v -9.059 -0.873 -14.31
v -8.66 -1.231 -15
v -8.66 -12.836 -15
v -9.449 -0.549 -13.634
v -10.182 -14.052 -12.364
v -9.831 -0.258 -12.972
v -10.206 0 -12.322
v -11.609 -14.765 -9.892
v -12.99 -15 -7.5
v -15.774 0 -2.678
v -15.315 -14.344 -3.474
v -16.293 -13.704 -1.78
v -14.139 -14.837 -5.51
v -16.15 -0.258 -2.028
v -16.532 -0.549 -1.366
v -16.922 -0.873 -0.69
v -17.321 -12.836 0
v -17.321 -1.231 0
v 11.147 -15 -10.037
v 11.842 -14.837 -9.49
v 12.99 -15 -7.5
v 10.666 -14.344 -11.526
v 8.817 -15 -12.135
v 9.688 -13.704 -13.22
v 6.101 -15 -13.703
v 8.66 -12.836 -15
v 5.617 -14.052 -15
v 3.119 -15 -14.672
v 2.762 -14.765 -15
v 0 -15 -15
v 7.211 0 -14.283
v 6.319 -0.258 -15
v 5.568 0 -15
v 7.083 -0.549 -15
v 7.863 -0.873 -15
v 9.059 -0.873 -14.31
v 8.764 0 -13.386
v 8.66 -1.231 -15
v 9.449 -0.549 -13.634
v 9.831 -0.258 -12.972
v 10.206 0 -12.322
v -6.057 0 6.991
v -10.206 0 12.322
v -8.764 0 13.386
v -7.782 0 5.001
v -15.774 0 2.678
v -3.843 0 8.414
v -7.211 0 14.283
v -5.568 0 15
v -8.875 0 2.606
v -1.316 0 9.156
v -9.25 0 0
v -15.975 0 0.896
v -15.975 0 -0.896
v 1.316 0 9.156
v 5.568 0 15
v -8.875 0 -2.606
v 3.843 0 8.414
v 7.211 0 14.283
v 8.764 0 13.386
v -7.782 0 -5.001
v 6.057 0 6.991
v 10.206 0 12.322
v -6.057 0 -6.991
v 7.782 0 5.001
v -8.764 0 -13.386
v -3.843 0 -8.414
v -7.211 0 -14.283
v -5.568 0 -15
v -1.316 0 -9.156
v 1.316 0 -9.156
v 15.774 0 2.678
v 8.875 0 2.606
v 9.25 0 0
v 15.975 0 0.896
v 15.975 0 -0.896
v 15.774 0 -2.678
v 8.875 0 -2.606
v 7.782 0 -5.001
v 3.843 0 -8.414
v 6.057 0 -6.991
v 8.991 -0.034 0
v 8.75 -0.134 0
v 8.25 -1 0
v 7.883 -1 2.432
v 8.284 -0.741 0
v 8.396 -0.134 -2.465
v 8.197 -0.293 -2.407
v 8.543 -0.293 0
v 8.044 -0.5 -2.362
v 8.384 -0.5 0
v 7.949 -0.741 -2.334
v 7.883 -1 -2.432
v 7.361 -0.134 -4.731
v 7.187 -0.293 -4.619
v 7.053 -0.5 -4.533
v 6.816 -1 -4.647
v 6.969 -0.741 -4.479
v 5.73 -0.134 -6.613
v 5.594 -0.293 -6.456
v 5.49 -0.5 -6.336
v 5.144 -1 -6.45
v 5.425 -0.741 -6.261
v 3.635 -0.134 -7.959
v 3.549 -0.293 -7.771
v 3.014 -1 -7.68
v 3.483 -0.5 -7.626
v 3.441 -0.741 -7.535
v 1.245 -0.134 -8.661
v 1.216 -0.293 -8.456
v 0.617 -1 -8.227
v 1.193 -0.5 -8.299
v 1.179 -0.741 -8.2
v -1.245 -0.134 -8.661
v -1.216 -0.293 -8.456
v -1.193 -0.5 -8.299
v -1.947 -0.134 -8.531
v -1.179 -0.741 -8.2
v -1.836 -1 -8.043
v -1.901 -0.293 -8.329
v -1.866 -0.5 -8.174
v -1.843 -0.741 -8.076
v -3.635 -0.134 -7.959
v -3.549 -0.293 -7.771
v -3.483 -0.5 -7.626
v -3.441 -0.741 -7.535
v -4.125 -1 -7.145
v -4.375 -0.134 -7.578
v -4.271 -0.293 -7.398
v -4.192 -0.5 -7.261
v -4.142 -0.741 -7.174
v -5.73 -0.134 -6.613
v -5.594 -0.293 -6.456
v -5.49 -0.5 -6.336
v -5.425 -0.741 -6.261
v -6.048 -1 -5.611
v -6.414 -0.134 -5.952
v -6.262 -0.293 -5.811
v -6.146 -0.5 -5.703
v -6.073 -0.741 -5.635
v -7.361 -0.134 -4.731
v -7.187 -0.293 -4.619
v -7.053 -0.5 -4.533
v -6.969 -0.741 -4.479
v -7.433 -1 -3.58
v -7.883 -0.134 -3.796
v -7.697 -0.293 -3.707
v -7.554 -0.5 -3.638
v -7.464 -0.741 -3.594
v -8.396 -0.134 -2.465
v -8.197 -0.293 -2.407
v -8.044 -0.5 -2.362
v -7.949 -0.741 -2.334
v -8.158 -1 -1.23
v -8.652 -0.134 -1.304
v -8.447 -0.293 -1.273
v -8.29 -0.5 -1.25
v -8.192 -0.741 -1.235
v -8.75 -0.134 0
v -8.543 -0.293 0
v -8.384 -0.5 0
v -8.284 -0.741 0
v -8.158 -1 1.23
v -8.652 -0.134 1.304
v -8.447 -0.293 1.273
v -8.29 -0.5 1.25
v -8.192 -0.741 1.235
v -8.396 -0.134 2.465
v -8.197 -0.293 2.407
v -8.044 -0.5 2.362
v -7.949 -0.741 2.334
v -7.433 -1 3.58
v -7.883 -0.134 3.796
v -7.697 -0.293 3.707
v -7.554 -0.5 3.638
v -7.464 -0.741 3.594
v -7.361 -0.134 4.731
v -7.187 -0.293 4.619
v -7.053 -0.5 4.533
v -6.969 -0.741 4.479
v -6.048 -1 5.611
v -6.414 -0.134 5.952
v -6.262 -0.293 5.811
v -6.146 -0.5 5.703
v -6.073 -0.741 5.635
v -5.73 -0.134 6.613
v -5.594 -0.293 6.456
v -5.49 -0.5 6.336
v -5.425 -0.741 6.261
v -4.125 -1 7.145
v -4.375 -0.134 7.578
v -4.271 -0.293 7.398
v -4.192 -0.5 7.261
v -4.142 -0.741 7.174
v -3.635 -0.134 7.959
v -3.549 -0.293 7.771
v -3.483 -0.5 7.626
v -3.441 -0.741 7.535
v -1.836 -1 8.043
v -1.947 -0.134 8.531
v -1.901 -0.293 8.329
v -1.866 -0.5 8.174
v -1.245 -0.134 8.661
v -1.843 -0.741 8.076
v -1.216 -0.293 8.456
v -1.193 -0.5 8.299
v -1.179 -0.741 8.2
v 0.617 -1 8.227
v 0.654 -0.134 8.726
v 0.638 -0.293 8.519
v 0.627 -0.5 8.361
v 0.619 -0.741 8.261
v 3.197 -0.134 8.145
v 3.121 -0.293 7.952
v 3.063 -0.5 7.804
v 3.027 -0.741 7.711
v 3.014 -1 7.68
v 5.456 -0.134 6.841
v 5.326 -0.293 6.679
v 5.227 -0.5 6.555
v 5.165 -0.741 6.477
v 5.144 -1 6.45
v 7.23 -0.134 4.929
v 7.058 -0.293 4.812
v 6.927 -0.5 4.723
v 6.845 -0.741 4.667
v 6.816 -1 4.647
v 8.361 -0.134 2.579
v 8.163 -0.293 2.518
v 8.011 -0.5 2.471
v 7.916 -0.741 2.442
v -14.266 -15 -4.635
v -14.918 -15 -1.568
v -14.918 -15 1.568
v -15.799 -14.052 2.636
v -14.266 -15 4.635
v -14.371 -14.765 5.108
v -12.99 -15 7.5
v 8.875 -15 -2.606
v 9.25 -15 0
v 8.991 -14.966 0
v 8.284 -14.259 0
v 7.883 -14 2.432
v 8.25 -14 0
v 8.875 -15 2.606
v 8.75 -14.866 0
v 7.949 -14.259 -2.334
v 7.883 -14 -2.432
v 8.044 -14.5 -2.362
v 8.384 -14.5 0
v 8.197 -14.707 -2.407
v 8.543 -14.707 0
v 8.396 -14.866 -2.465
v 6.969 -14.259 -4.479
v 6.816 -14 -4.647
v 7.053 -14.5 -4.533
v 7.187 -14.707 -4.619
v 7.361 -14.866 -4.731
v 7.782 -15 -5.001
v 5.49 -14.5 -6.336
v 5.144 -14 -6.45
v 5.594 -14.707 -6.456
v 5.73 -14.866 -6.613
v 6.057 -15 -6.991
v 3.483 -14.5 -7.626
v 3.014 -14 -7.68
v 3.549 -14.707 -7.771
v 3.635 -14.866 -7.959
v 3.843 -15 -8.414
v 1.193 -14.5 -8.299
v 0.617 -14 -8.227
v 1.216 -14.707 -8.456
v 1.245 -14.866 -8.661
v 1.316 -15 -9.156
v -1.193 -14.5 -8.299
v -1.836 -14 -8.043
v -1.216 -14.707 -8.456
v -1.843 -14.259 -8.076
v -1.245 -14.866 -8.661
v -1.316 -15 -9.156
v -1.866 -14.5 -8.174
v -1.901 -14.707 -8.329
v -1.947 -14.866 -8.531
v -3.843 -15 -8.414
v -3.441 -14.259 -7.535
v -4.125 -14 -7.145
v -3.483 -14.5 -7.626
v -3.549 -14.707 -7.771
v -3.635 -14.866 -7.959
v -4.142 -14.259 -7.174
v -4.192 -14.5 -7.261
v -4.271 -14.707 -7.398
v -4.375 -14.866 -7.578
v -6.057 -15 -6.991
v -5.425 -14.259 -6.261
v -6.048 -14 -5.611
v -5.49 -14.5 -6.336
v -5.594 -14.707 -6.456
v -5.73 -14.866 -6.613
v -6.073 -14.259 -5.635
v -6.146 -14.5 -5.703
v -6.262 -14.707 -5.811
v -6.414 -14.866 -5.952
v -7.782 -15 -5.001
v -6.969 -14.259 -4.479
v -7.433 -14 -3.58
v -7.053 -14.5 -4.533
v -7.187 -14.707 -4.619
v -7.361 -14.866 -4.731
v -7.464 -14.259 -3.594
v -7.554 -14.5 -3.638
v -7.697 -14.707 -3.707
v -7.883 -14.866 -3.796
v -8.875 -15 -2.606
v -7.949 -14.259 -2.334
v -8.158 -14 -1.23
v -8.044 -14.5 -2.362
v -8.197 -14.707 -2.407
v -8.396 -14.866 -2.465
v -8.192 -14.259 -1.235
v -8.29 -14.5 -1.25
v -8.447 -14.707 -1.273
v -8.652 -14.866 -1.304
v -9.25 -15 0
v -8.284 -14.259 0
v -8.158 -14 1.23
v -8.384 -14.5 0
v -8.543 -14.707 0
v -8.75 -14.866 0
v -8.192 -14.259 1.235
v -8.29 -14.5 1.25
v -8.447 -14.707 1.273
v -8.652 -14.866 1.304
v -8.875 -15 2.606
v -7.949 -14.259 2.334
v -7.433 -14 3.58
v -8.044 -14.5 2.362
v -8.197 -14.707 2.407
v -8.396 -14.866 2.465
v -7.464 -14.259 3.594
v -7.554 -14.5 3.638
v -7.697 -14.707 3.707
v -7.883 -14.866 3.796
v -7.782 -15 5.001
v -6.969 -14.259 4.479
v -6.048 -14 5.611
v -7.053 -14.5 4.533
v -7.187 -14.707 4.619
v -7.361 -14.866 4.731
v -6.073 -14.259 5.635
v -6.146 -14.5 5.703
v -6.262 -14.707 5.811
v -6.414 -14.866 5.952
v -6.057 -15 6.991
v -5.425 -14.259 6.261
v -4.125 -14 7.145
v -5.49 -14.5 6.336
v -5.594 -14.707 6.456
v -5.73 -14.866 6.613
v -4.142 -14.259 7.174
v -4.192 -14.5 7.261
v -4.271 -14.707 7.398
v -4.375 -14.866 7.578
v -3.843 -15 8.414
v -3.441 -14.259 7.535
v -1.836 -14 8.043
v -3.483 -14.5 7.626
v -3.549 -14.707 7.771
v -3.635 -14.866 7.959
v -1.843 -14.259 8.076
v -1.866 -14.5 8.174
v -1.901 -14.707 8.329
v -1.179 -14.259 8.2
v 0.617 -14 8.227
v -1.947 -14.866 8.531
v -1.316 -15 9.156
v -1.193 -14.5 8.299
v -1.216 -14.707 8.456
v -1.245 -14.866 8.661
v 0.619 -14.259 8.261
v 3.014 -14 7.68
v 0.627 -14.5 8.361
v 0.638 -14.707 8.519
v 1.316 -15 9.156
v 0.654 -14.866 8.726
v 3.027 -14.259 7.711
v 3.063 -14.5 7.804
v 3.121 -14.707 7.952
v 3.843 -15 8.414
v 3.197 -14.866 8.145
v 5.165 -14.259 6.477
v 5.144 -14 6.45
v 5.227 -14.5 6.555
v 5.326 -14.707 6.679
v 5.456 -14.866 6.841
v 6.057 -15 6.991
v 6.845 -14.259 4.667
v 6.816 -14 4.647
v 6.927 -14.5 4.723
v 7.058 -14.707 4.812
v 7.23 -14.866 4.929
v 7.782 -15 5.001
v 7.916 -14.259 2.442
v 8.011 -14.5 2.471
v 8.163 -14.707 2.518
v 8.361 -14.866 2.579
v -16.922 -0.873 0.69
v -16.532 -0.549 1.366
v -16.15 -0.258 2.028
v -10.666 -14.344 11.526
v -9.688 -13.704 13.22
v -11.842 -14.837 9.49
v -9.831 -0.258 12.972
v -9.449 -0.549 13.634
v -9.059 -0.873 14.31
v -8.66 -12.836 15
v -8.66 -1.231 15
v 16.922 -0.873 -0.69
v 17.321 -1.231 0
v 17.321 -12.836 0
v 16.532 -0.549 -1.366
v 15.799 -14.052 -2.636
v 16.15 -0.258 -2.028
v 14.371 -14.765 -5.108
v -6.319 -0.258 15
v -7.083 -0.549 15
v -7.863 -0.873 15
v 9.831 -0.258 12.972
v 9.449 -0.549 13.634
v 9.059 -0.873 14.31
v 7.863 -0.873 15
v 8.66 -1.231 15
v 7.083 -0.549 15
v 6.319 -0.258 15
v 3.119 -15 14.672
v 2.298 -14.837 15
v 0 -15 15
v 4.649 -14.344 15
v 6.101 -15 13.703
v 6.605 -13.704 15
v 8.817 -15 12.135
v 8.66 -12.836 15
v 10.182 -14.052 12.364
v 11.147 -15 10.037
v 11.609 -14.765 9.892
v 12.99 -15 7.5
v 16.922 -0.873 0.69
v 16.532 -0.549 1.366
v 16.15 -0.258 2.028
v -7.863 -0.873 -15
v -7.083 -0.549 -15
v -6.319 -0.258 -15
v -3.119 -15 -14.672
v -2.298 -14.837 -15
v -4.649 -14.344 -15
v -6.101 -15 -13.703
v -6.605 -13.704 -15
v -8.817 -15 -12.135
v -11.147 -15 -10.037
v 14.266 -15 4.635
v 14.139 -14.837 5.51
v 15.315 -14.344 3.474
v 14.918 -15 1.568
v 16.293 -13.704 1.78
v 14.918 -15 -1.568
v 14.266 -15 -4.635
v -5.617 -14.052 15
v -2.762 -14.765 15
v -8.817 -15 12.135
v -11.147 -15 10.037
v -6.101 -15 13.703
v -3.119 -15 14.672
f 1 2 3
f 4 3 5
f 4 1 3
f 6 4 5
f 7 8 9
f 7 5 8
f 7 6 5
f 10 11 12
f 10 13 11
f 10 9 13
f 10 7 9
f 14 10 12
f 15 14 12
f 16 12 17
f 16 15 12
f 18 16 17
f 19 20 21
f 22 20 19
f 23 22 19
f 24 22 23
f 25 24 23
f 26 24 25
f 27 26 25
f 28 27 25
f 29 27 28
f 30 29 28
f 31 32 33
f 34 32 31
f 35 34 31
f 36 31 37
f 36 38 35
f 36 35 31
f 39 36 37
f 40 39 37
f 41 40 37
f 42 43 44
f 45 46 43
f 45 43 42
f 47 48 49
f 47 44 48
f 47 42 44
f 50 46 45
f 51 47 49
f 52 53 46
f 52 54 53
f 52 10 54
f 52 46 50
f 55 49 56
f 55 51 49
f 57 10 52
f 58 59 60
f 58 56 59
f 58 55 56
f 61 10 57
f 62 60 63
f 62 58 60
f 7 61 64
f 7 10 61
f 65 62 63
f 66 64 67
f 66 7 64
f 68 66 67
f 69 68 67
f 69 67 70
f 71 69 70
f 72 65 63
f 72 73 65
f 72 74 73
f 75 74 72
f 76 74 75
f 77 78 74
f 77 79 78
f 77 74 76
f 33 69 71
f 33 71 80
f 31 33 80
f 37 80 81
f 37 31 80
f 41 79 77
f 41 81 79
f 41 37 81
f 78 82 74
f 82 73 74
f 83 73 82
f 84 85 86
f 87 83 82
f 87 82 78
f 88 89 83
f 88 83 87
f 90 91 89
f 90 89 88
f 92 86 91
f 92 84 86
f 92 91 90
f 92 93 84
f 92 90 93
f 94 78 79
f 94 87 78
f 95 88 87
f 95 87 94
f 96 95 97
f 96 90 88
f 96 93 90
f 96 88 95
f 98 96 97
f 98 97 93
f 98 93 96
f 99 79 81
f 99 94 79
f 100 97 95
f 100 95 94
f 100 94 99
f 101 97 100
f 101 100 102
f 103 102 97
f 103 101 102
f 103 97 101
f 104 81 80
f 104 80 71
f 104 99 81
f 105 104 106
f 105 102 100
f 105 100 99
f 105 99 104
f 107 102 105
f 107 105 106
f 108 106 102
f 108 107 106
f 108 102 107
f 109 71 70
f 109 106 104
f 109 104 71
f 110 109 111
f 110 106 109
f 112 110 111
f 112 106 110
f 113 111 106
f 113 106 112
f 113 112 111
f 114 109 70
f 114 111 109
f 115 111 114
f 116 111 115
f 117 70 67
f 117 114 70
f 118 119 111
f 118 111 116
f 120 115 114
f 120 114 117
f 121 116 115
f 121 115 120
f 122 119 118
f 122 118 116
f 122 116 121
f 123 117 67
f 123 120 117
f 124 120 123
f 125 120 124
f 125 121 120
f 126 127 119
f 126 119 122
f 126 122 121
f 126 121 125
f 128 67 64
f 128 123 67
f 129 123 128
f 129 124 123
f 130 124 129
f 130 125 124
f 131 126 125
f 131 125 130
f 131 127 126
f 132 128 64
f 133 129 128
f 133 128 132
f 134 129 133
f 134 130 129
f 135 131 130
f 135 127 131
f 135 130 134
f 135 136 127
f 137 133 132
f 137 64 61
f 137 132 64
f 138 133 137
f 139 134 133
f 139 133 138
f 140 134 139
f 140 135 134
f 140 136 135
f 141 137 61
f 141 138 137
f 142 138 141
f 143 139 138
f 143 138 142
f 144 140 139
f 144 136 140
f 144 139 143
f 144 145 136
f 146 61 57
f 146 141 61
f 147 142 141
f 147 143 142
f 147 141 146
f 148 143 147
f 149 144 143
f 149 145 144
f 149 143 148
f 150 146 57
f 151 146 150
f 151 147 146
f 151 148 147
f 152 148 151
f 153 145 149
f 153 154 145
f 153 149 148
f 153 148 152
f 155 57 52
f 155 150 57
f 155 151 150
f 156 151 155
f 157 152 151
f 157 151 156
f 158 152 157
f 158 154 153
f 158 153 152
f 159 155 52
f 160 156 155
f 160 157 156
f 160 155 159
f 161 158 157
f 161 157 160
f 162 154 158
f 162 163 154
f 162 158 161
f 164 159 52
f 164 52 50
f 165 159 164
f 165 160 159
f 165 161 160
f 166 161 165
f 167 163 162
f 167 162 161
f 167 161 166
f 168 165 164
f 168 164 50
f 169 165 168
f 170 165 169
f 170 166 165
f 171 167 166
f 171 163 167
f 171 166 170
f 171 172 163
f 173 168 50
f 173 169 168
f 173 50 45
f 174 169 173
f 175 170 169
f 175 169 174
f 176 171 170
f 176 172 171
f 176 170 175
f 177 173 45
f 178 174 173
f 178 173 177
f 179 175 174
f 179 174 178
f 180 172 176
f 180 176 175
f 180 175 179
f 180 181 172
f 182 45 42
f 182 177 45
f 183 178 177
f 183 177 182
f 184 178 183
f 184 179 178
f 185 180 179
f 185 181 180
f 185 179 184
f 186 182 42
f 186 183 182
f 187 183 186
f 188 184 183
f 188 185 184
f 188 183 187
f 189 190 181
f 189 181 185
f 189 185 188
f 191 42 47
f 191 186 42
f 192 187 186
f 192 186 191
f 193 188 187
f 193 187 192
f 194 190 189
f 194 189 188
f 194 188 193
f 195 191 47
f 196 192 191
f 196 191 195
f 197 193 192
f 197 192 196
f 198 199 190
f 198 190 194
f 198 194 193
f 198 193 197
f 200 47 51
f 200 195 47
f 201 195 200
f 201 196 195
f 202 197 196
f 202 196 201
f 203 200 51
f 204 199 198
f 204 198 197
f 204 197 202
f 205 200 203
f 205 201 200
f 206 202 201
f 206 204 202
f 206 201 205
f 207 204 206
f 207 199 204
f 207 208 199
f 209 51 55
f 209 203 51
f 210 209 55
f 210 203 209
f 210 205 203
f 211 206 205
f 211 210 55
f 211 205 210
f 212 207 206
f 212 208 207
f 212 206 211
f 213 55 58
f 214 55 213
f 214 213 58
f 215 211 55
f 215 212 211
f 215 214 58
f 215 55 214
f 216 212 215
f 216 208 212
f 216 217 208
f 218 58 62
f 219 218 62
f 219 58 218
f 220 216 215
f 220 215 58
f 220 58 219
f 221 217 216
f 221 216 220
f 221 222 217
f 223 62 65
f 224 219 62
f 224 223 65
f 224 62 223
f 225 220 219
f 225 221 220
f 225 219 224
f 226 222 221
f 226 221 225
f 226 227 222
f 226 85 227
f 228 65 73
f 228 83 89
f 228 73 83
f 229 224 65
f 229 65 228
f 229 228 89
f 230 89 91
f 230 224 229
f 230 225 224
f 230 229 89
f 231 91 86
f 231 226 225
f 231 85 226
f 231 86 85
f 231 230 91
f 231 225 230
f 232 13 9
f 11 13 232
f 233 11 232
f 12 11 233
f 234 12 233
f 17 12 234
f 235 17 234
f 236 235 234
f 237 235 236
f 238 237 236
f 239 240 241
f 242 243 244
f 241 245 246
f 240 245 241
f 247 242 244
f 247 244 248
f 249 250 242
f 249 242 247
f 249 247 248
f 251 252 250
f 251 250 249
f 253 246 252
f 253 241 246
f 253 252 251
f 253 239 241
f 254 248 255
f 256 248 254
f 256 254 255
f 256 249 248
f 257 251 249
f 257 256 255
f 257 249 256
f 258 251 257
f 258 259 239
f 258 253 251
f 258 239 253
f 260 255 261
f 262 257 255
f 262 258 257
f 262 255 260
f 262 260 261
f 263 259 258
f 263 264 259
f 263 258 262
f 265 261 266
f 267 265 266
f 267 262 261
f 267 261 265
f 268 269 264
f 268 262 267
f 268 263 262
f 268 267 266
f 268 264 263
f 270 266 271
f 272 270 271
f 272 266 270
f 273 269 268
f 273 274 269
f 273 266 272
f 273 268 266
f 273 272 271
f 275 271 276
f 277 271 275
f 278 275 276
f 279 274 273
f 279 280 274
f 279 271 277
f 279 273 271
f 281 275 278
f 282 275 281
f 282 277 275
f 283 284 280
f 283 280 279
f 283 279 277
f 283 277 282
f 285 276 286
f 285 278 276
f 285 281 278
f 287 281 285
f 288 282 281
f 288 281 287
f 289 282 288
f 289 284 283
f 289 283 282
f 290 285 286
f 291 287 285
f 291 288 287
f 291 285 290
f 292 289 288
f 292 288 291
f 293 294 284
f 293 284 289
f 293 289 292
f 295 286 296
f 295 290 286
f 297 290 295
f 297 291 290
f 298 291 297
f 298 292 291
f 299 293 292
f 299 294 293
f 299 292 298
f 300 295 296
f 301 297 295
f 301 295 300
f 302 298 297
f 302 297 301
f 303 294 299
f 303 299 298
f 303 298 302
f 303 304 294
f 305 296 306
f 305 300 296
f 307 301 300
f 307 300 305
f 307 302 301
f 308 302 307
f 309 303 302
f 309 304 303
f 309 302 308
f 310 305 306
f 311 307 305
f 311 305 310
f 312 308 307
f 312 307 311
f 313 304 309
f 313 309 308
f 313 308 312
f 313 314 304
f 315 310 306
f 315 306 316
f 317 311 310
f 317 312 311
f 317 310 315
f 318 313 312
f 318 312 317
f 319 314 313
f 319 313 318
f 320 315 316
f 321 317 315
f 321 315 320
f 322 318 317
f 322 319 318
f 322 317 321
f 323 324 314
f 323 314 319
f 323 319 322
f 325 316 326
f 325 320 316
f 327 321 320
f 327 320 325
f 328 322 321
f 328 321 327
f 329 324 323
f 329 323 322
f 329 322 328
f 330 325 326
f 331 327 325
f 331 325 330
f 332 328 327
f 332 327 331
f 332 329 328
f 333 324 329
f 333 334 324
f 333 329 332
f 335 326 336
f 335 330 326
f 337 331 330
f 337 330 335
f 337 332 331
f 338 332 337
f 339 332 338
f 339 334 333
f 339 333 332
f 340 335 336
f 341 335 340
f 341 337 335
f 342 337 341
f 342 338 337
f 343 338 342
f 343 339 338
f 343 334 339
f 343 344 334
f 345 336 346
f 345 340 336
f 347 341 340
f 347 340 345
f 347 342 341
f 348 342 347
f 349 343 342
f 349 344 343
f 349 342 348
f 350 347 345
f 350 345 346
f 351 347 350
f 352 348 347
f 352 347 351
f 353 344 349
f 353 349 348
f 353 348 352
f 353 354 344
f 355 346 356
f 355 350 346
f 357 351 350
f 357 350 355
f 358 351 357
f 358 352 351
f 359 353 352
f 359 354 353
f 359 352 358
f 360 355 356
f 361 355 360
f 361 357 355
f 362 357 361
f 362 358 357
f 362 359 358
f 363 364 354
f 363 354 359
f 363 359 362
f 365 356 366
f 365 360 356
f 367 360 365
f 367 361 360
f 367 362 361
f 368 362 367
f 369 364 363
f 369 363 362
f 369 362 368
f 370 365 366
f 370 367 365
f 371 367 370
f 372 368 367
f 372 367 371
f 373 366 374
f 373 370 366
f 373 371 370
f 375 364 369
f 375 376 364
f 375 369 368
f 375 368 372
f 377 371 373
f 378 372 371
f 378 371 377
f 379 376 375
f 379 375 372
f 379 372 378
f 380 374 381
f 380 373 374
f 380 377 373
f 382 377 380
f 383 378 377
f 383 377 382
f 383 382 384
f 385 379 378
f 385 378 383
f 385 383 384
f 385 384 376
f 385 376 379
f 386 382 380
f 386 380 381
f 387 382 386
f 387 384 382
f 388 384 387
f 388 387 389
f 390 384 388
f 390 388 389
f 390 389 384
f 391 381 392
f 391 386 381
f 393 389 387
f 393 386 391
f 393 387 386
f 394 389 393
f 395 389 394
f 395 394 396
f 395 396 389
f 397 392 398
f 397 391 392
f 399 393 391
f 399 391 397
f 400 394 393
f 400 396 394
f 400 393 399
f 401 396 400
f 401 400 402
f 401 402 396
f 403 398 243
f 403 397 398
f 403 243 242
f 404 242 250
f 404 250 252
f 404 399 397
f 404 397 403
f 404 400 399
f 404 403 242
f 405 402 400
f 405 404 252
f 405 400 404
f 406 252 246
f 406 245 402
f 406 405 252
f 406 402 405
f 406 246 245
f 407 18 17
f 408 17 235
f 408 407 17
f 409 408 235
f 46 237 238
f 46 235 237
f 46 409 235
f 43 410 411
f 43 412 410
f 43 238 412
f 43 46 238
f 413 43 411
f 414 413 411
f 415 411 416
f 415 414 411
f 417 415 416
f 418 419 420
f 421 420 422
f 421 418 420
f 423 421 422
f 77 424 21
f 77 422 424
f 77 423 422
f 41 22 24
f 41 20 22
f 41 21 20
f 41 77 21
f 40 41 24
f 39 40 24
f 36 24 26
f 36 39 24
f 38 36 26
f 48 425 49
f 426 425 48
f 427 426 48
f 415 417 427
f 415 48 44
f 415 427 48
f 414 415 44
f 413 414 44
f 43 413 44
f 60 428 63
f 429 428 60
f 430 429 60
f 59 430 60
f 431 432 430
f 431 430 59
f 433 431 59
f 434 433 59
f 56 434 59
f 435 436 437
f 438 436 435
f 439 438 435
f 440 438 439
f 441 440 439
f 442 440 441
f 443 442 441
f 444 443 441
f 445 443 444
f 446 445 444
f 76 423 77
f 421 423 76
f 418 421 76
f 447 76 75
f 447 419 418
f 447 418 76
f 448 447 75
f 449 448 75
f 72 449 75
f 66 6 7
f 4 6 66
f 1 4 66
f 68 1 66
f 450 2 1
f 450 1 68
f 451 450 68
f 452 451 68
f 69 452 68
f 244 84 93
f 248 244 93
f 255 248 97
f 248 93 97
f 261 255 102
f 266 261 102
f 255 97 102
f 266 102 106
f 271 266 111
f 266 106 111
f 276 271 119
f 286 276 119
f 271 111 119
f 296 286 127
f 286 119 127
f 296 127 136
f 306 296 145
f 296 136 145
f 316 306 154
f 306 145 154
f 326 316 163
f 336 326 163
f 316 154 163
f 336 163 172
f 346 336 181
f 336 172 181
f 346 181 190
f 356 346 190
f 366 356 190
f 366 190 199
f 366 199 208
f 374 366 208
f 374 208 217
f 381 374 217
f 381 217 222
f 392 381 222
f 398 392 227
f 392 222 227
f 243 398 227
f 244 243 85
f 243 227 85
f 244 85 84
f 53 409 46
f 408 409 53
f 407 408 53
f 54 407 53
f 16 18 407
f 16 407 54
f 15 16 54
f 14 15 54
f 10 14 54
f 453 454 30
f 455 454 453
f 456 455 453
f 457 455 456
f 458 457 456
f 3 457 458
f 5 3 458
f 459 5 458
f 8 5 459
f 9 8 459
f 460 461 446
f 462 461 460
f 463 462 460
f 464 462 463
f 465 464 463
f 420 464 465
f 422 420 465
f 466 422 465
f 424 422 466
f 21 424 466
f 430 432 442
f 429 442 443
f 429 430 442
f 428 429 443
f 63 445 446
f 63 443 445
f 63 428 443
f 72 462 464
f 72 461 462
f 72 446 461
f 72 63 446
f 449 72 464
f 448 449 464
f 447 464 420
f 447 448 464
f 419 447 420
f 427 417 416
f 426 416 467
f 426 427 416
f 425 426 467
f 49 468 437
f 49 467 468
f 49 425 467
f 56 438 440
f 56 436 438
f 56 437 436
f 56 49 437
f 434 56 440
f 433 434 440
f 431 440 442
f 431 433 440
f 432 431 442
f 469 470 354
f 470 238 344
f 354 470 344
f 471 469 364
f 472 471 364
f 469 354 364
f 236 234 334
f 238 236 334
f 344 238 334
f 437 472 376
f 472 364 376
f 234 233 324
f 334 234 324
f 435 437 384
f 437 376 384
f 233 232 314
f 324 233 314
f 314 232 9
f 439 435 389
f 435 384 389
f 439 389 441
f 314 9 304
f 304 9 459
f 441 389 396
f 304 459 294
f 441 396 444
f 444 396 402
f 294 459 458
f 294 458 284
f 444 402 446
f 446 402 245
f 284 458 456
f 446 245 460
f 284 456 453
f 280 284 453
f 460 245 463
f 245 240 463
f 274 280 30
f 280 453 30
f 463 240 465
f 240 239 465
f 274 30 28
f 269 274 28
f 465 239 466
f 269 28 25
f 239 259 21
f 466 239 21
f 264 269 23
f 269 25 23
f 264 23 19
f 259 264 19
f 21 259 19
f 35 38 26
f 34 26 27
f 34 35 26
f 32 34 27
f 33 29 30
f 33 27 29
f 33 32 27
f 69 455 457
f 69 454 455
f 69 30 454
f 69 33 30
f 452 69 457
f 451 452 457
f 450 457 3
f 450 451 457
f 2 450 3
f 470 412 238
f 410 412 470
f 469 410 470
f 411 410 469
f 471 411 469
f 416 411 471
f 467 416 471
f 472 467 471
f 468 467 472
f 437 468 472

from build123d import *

# Parameters (mm, degrees)
SALIENTE_EXTRUIR1_DEPTH = 15
CROQUIS2_OUTSIDE_W      = 78.456
CROQUIS2_OUTSIDE_H      = 73.814
CROQUIS2_OUTSIDE_R      = 16
CORTAR_EXTRUIR1_DEPTH   = 15
CORTAR_EXTRUIR1_TAPER   = 47
CROQUIS3_OUTSIDE_W      = 78.456
CROQUIS3_OUTSIDE_H      = 73.814
CROQUIS3_OUTSIDE_R      = 15
CORTAR_EXTRUIR2_DEPTH   = 15
CORTAR_EXTRUIR2_TAPER   = 47
CROQUIS4_R              = 8.25
CORTAR_EXTRUIR3_DEPTH   = 15
REDONDEO1_R             = 1


with BuildPart() as part:
    # Croquis1 → Saliente-Extruir1 (new body)
    with BuildSketch(Plane(origin=(0, 0, 0), x_dir=(1, 0, 0), z_dir=(0, 1, 0))):
        Polygon((-8.660254038, -15), (8.660254038, -15), (17.320508076, 0), (8.660254038, 15), (-8.660254038, 15), (-17.320508076, 0), align=None)
    extrude(amount=-SALIENTE_EXTRUIR1_DEPTH)

    # Croquis2 outside → Cortar-Extruir1 (cut)
    with BuildSketch(Plane(origin=(0, 0, 0), x_dir=(1, 0, 0), z_dir=(0, 1, 0))):
        Rectangle(CROQUIS2_OUTSIDE_W, CROQUIS2_OUTSIDE_H)
        Circle(CROQUIS2_OUTSIDE_R, mode=Mode.SUBTRACT)
    extrude(amount=-CORTAR_EXTRUIR1_DEPTH, taper=CORTAR_EXTRUIR1_TAPER, mode=Mode.SUBTRACT)

    # Croquis3 outside → Cortar-Extruir2 (cut)
    with BuildSketch(Plane.XZ.offset(15)):
        Rectangle(CROQUIS3_OUTSIDE_W, CROQUIS3_OUTSIDE_H)
        Circle(CROQUIS3_OUTSIDE_R, mode=Mode.SUBTRACT)
    extrude(amount=-CORTAR_EXTRUIR2_DEPTH, taper=CORTAR_EXTRUIR2_TAPER, mode=Mode.SUBTRACT)

    # Croquis4 → Cortar-Extruir3 (cut)
    with BuildSketch(Plane(origin=(0, 0, 0), x_dir=(1, 0, 0), z_dir=(0, 1, 0))):
        Circle(CROQUIS4_R)
    extrude(amount=-CORTAR_EXTRUIR3_DEPTH, mode=Mode.SUBTRACT)

    # Redondeo1
    redondeo1_edges = [part.edges().sort_by_distance(p)[0] for p in [
        (-8.25, -15, 0),
        (-8.25, 0, 0),
    ]]
    fillet(redondeo1_edges, radius=REDONDEO1_R)


solid = part.part
